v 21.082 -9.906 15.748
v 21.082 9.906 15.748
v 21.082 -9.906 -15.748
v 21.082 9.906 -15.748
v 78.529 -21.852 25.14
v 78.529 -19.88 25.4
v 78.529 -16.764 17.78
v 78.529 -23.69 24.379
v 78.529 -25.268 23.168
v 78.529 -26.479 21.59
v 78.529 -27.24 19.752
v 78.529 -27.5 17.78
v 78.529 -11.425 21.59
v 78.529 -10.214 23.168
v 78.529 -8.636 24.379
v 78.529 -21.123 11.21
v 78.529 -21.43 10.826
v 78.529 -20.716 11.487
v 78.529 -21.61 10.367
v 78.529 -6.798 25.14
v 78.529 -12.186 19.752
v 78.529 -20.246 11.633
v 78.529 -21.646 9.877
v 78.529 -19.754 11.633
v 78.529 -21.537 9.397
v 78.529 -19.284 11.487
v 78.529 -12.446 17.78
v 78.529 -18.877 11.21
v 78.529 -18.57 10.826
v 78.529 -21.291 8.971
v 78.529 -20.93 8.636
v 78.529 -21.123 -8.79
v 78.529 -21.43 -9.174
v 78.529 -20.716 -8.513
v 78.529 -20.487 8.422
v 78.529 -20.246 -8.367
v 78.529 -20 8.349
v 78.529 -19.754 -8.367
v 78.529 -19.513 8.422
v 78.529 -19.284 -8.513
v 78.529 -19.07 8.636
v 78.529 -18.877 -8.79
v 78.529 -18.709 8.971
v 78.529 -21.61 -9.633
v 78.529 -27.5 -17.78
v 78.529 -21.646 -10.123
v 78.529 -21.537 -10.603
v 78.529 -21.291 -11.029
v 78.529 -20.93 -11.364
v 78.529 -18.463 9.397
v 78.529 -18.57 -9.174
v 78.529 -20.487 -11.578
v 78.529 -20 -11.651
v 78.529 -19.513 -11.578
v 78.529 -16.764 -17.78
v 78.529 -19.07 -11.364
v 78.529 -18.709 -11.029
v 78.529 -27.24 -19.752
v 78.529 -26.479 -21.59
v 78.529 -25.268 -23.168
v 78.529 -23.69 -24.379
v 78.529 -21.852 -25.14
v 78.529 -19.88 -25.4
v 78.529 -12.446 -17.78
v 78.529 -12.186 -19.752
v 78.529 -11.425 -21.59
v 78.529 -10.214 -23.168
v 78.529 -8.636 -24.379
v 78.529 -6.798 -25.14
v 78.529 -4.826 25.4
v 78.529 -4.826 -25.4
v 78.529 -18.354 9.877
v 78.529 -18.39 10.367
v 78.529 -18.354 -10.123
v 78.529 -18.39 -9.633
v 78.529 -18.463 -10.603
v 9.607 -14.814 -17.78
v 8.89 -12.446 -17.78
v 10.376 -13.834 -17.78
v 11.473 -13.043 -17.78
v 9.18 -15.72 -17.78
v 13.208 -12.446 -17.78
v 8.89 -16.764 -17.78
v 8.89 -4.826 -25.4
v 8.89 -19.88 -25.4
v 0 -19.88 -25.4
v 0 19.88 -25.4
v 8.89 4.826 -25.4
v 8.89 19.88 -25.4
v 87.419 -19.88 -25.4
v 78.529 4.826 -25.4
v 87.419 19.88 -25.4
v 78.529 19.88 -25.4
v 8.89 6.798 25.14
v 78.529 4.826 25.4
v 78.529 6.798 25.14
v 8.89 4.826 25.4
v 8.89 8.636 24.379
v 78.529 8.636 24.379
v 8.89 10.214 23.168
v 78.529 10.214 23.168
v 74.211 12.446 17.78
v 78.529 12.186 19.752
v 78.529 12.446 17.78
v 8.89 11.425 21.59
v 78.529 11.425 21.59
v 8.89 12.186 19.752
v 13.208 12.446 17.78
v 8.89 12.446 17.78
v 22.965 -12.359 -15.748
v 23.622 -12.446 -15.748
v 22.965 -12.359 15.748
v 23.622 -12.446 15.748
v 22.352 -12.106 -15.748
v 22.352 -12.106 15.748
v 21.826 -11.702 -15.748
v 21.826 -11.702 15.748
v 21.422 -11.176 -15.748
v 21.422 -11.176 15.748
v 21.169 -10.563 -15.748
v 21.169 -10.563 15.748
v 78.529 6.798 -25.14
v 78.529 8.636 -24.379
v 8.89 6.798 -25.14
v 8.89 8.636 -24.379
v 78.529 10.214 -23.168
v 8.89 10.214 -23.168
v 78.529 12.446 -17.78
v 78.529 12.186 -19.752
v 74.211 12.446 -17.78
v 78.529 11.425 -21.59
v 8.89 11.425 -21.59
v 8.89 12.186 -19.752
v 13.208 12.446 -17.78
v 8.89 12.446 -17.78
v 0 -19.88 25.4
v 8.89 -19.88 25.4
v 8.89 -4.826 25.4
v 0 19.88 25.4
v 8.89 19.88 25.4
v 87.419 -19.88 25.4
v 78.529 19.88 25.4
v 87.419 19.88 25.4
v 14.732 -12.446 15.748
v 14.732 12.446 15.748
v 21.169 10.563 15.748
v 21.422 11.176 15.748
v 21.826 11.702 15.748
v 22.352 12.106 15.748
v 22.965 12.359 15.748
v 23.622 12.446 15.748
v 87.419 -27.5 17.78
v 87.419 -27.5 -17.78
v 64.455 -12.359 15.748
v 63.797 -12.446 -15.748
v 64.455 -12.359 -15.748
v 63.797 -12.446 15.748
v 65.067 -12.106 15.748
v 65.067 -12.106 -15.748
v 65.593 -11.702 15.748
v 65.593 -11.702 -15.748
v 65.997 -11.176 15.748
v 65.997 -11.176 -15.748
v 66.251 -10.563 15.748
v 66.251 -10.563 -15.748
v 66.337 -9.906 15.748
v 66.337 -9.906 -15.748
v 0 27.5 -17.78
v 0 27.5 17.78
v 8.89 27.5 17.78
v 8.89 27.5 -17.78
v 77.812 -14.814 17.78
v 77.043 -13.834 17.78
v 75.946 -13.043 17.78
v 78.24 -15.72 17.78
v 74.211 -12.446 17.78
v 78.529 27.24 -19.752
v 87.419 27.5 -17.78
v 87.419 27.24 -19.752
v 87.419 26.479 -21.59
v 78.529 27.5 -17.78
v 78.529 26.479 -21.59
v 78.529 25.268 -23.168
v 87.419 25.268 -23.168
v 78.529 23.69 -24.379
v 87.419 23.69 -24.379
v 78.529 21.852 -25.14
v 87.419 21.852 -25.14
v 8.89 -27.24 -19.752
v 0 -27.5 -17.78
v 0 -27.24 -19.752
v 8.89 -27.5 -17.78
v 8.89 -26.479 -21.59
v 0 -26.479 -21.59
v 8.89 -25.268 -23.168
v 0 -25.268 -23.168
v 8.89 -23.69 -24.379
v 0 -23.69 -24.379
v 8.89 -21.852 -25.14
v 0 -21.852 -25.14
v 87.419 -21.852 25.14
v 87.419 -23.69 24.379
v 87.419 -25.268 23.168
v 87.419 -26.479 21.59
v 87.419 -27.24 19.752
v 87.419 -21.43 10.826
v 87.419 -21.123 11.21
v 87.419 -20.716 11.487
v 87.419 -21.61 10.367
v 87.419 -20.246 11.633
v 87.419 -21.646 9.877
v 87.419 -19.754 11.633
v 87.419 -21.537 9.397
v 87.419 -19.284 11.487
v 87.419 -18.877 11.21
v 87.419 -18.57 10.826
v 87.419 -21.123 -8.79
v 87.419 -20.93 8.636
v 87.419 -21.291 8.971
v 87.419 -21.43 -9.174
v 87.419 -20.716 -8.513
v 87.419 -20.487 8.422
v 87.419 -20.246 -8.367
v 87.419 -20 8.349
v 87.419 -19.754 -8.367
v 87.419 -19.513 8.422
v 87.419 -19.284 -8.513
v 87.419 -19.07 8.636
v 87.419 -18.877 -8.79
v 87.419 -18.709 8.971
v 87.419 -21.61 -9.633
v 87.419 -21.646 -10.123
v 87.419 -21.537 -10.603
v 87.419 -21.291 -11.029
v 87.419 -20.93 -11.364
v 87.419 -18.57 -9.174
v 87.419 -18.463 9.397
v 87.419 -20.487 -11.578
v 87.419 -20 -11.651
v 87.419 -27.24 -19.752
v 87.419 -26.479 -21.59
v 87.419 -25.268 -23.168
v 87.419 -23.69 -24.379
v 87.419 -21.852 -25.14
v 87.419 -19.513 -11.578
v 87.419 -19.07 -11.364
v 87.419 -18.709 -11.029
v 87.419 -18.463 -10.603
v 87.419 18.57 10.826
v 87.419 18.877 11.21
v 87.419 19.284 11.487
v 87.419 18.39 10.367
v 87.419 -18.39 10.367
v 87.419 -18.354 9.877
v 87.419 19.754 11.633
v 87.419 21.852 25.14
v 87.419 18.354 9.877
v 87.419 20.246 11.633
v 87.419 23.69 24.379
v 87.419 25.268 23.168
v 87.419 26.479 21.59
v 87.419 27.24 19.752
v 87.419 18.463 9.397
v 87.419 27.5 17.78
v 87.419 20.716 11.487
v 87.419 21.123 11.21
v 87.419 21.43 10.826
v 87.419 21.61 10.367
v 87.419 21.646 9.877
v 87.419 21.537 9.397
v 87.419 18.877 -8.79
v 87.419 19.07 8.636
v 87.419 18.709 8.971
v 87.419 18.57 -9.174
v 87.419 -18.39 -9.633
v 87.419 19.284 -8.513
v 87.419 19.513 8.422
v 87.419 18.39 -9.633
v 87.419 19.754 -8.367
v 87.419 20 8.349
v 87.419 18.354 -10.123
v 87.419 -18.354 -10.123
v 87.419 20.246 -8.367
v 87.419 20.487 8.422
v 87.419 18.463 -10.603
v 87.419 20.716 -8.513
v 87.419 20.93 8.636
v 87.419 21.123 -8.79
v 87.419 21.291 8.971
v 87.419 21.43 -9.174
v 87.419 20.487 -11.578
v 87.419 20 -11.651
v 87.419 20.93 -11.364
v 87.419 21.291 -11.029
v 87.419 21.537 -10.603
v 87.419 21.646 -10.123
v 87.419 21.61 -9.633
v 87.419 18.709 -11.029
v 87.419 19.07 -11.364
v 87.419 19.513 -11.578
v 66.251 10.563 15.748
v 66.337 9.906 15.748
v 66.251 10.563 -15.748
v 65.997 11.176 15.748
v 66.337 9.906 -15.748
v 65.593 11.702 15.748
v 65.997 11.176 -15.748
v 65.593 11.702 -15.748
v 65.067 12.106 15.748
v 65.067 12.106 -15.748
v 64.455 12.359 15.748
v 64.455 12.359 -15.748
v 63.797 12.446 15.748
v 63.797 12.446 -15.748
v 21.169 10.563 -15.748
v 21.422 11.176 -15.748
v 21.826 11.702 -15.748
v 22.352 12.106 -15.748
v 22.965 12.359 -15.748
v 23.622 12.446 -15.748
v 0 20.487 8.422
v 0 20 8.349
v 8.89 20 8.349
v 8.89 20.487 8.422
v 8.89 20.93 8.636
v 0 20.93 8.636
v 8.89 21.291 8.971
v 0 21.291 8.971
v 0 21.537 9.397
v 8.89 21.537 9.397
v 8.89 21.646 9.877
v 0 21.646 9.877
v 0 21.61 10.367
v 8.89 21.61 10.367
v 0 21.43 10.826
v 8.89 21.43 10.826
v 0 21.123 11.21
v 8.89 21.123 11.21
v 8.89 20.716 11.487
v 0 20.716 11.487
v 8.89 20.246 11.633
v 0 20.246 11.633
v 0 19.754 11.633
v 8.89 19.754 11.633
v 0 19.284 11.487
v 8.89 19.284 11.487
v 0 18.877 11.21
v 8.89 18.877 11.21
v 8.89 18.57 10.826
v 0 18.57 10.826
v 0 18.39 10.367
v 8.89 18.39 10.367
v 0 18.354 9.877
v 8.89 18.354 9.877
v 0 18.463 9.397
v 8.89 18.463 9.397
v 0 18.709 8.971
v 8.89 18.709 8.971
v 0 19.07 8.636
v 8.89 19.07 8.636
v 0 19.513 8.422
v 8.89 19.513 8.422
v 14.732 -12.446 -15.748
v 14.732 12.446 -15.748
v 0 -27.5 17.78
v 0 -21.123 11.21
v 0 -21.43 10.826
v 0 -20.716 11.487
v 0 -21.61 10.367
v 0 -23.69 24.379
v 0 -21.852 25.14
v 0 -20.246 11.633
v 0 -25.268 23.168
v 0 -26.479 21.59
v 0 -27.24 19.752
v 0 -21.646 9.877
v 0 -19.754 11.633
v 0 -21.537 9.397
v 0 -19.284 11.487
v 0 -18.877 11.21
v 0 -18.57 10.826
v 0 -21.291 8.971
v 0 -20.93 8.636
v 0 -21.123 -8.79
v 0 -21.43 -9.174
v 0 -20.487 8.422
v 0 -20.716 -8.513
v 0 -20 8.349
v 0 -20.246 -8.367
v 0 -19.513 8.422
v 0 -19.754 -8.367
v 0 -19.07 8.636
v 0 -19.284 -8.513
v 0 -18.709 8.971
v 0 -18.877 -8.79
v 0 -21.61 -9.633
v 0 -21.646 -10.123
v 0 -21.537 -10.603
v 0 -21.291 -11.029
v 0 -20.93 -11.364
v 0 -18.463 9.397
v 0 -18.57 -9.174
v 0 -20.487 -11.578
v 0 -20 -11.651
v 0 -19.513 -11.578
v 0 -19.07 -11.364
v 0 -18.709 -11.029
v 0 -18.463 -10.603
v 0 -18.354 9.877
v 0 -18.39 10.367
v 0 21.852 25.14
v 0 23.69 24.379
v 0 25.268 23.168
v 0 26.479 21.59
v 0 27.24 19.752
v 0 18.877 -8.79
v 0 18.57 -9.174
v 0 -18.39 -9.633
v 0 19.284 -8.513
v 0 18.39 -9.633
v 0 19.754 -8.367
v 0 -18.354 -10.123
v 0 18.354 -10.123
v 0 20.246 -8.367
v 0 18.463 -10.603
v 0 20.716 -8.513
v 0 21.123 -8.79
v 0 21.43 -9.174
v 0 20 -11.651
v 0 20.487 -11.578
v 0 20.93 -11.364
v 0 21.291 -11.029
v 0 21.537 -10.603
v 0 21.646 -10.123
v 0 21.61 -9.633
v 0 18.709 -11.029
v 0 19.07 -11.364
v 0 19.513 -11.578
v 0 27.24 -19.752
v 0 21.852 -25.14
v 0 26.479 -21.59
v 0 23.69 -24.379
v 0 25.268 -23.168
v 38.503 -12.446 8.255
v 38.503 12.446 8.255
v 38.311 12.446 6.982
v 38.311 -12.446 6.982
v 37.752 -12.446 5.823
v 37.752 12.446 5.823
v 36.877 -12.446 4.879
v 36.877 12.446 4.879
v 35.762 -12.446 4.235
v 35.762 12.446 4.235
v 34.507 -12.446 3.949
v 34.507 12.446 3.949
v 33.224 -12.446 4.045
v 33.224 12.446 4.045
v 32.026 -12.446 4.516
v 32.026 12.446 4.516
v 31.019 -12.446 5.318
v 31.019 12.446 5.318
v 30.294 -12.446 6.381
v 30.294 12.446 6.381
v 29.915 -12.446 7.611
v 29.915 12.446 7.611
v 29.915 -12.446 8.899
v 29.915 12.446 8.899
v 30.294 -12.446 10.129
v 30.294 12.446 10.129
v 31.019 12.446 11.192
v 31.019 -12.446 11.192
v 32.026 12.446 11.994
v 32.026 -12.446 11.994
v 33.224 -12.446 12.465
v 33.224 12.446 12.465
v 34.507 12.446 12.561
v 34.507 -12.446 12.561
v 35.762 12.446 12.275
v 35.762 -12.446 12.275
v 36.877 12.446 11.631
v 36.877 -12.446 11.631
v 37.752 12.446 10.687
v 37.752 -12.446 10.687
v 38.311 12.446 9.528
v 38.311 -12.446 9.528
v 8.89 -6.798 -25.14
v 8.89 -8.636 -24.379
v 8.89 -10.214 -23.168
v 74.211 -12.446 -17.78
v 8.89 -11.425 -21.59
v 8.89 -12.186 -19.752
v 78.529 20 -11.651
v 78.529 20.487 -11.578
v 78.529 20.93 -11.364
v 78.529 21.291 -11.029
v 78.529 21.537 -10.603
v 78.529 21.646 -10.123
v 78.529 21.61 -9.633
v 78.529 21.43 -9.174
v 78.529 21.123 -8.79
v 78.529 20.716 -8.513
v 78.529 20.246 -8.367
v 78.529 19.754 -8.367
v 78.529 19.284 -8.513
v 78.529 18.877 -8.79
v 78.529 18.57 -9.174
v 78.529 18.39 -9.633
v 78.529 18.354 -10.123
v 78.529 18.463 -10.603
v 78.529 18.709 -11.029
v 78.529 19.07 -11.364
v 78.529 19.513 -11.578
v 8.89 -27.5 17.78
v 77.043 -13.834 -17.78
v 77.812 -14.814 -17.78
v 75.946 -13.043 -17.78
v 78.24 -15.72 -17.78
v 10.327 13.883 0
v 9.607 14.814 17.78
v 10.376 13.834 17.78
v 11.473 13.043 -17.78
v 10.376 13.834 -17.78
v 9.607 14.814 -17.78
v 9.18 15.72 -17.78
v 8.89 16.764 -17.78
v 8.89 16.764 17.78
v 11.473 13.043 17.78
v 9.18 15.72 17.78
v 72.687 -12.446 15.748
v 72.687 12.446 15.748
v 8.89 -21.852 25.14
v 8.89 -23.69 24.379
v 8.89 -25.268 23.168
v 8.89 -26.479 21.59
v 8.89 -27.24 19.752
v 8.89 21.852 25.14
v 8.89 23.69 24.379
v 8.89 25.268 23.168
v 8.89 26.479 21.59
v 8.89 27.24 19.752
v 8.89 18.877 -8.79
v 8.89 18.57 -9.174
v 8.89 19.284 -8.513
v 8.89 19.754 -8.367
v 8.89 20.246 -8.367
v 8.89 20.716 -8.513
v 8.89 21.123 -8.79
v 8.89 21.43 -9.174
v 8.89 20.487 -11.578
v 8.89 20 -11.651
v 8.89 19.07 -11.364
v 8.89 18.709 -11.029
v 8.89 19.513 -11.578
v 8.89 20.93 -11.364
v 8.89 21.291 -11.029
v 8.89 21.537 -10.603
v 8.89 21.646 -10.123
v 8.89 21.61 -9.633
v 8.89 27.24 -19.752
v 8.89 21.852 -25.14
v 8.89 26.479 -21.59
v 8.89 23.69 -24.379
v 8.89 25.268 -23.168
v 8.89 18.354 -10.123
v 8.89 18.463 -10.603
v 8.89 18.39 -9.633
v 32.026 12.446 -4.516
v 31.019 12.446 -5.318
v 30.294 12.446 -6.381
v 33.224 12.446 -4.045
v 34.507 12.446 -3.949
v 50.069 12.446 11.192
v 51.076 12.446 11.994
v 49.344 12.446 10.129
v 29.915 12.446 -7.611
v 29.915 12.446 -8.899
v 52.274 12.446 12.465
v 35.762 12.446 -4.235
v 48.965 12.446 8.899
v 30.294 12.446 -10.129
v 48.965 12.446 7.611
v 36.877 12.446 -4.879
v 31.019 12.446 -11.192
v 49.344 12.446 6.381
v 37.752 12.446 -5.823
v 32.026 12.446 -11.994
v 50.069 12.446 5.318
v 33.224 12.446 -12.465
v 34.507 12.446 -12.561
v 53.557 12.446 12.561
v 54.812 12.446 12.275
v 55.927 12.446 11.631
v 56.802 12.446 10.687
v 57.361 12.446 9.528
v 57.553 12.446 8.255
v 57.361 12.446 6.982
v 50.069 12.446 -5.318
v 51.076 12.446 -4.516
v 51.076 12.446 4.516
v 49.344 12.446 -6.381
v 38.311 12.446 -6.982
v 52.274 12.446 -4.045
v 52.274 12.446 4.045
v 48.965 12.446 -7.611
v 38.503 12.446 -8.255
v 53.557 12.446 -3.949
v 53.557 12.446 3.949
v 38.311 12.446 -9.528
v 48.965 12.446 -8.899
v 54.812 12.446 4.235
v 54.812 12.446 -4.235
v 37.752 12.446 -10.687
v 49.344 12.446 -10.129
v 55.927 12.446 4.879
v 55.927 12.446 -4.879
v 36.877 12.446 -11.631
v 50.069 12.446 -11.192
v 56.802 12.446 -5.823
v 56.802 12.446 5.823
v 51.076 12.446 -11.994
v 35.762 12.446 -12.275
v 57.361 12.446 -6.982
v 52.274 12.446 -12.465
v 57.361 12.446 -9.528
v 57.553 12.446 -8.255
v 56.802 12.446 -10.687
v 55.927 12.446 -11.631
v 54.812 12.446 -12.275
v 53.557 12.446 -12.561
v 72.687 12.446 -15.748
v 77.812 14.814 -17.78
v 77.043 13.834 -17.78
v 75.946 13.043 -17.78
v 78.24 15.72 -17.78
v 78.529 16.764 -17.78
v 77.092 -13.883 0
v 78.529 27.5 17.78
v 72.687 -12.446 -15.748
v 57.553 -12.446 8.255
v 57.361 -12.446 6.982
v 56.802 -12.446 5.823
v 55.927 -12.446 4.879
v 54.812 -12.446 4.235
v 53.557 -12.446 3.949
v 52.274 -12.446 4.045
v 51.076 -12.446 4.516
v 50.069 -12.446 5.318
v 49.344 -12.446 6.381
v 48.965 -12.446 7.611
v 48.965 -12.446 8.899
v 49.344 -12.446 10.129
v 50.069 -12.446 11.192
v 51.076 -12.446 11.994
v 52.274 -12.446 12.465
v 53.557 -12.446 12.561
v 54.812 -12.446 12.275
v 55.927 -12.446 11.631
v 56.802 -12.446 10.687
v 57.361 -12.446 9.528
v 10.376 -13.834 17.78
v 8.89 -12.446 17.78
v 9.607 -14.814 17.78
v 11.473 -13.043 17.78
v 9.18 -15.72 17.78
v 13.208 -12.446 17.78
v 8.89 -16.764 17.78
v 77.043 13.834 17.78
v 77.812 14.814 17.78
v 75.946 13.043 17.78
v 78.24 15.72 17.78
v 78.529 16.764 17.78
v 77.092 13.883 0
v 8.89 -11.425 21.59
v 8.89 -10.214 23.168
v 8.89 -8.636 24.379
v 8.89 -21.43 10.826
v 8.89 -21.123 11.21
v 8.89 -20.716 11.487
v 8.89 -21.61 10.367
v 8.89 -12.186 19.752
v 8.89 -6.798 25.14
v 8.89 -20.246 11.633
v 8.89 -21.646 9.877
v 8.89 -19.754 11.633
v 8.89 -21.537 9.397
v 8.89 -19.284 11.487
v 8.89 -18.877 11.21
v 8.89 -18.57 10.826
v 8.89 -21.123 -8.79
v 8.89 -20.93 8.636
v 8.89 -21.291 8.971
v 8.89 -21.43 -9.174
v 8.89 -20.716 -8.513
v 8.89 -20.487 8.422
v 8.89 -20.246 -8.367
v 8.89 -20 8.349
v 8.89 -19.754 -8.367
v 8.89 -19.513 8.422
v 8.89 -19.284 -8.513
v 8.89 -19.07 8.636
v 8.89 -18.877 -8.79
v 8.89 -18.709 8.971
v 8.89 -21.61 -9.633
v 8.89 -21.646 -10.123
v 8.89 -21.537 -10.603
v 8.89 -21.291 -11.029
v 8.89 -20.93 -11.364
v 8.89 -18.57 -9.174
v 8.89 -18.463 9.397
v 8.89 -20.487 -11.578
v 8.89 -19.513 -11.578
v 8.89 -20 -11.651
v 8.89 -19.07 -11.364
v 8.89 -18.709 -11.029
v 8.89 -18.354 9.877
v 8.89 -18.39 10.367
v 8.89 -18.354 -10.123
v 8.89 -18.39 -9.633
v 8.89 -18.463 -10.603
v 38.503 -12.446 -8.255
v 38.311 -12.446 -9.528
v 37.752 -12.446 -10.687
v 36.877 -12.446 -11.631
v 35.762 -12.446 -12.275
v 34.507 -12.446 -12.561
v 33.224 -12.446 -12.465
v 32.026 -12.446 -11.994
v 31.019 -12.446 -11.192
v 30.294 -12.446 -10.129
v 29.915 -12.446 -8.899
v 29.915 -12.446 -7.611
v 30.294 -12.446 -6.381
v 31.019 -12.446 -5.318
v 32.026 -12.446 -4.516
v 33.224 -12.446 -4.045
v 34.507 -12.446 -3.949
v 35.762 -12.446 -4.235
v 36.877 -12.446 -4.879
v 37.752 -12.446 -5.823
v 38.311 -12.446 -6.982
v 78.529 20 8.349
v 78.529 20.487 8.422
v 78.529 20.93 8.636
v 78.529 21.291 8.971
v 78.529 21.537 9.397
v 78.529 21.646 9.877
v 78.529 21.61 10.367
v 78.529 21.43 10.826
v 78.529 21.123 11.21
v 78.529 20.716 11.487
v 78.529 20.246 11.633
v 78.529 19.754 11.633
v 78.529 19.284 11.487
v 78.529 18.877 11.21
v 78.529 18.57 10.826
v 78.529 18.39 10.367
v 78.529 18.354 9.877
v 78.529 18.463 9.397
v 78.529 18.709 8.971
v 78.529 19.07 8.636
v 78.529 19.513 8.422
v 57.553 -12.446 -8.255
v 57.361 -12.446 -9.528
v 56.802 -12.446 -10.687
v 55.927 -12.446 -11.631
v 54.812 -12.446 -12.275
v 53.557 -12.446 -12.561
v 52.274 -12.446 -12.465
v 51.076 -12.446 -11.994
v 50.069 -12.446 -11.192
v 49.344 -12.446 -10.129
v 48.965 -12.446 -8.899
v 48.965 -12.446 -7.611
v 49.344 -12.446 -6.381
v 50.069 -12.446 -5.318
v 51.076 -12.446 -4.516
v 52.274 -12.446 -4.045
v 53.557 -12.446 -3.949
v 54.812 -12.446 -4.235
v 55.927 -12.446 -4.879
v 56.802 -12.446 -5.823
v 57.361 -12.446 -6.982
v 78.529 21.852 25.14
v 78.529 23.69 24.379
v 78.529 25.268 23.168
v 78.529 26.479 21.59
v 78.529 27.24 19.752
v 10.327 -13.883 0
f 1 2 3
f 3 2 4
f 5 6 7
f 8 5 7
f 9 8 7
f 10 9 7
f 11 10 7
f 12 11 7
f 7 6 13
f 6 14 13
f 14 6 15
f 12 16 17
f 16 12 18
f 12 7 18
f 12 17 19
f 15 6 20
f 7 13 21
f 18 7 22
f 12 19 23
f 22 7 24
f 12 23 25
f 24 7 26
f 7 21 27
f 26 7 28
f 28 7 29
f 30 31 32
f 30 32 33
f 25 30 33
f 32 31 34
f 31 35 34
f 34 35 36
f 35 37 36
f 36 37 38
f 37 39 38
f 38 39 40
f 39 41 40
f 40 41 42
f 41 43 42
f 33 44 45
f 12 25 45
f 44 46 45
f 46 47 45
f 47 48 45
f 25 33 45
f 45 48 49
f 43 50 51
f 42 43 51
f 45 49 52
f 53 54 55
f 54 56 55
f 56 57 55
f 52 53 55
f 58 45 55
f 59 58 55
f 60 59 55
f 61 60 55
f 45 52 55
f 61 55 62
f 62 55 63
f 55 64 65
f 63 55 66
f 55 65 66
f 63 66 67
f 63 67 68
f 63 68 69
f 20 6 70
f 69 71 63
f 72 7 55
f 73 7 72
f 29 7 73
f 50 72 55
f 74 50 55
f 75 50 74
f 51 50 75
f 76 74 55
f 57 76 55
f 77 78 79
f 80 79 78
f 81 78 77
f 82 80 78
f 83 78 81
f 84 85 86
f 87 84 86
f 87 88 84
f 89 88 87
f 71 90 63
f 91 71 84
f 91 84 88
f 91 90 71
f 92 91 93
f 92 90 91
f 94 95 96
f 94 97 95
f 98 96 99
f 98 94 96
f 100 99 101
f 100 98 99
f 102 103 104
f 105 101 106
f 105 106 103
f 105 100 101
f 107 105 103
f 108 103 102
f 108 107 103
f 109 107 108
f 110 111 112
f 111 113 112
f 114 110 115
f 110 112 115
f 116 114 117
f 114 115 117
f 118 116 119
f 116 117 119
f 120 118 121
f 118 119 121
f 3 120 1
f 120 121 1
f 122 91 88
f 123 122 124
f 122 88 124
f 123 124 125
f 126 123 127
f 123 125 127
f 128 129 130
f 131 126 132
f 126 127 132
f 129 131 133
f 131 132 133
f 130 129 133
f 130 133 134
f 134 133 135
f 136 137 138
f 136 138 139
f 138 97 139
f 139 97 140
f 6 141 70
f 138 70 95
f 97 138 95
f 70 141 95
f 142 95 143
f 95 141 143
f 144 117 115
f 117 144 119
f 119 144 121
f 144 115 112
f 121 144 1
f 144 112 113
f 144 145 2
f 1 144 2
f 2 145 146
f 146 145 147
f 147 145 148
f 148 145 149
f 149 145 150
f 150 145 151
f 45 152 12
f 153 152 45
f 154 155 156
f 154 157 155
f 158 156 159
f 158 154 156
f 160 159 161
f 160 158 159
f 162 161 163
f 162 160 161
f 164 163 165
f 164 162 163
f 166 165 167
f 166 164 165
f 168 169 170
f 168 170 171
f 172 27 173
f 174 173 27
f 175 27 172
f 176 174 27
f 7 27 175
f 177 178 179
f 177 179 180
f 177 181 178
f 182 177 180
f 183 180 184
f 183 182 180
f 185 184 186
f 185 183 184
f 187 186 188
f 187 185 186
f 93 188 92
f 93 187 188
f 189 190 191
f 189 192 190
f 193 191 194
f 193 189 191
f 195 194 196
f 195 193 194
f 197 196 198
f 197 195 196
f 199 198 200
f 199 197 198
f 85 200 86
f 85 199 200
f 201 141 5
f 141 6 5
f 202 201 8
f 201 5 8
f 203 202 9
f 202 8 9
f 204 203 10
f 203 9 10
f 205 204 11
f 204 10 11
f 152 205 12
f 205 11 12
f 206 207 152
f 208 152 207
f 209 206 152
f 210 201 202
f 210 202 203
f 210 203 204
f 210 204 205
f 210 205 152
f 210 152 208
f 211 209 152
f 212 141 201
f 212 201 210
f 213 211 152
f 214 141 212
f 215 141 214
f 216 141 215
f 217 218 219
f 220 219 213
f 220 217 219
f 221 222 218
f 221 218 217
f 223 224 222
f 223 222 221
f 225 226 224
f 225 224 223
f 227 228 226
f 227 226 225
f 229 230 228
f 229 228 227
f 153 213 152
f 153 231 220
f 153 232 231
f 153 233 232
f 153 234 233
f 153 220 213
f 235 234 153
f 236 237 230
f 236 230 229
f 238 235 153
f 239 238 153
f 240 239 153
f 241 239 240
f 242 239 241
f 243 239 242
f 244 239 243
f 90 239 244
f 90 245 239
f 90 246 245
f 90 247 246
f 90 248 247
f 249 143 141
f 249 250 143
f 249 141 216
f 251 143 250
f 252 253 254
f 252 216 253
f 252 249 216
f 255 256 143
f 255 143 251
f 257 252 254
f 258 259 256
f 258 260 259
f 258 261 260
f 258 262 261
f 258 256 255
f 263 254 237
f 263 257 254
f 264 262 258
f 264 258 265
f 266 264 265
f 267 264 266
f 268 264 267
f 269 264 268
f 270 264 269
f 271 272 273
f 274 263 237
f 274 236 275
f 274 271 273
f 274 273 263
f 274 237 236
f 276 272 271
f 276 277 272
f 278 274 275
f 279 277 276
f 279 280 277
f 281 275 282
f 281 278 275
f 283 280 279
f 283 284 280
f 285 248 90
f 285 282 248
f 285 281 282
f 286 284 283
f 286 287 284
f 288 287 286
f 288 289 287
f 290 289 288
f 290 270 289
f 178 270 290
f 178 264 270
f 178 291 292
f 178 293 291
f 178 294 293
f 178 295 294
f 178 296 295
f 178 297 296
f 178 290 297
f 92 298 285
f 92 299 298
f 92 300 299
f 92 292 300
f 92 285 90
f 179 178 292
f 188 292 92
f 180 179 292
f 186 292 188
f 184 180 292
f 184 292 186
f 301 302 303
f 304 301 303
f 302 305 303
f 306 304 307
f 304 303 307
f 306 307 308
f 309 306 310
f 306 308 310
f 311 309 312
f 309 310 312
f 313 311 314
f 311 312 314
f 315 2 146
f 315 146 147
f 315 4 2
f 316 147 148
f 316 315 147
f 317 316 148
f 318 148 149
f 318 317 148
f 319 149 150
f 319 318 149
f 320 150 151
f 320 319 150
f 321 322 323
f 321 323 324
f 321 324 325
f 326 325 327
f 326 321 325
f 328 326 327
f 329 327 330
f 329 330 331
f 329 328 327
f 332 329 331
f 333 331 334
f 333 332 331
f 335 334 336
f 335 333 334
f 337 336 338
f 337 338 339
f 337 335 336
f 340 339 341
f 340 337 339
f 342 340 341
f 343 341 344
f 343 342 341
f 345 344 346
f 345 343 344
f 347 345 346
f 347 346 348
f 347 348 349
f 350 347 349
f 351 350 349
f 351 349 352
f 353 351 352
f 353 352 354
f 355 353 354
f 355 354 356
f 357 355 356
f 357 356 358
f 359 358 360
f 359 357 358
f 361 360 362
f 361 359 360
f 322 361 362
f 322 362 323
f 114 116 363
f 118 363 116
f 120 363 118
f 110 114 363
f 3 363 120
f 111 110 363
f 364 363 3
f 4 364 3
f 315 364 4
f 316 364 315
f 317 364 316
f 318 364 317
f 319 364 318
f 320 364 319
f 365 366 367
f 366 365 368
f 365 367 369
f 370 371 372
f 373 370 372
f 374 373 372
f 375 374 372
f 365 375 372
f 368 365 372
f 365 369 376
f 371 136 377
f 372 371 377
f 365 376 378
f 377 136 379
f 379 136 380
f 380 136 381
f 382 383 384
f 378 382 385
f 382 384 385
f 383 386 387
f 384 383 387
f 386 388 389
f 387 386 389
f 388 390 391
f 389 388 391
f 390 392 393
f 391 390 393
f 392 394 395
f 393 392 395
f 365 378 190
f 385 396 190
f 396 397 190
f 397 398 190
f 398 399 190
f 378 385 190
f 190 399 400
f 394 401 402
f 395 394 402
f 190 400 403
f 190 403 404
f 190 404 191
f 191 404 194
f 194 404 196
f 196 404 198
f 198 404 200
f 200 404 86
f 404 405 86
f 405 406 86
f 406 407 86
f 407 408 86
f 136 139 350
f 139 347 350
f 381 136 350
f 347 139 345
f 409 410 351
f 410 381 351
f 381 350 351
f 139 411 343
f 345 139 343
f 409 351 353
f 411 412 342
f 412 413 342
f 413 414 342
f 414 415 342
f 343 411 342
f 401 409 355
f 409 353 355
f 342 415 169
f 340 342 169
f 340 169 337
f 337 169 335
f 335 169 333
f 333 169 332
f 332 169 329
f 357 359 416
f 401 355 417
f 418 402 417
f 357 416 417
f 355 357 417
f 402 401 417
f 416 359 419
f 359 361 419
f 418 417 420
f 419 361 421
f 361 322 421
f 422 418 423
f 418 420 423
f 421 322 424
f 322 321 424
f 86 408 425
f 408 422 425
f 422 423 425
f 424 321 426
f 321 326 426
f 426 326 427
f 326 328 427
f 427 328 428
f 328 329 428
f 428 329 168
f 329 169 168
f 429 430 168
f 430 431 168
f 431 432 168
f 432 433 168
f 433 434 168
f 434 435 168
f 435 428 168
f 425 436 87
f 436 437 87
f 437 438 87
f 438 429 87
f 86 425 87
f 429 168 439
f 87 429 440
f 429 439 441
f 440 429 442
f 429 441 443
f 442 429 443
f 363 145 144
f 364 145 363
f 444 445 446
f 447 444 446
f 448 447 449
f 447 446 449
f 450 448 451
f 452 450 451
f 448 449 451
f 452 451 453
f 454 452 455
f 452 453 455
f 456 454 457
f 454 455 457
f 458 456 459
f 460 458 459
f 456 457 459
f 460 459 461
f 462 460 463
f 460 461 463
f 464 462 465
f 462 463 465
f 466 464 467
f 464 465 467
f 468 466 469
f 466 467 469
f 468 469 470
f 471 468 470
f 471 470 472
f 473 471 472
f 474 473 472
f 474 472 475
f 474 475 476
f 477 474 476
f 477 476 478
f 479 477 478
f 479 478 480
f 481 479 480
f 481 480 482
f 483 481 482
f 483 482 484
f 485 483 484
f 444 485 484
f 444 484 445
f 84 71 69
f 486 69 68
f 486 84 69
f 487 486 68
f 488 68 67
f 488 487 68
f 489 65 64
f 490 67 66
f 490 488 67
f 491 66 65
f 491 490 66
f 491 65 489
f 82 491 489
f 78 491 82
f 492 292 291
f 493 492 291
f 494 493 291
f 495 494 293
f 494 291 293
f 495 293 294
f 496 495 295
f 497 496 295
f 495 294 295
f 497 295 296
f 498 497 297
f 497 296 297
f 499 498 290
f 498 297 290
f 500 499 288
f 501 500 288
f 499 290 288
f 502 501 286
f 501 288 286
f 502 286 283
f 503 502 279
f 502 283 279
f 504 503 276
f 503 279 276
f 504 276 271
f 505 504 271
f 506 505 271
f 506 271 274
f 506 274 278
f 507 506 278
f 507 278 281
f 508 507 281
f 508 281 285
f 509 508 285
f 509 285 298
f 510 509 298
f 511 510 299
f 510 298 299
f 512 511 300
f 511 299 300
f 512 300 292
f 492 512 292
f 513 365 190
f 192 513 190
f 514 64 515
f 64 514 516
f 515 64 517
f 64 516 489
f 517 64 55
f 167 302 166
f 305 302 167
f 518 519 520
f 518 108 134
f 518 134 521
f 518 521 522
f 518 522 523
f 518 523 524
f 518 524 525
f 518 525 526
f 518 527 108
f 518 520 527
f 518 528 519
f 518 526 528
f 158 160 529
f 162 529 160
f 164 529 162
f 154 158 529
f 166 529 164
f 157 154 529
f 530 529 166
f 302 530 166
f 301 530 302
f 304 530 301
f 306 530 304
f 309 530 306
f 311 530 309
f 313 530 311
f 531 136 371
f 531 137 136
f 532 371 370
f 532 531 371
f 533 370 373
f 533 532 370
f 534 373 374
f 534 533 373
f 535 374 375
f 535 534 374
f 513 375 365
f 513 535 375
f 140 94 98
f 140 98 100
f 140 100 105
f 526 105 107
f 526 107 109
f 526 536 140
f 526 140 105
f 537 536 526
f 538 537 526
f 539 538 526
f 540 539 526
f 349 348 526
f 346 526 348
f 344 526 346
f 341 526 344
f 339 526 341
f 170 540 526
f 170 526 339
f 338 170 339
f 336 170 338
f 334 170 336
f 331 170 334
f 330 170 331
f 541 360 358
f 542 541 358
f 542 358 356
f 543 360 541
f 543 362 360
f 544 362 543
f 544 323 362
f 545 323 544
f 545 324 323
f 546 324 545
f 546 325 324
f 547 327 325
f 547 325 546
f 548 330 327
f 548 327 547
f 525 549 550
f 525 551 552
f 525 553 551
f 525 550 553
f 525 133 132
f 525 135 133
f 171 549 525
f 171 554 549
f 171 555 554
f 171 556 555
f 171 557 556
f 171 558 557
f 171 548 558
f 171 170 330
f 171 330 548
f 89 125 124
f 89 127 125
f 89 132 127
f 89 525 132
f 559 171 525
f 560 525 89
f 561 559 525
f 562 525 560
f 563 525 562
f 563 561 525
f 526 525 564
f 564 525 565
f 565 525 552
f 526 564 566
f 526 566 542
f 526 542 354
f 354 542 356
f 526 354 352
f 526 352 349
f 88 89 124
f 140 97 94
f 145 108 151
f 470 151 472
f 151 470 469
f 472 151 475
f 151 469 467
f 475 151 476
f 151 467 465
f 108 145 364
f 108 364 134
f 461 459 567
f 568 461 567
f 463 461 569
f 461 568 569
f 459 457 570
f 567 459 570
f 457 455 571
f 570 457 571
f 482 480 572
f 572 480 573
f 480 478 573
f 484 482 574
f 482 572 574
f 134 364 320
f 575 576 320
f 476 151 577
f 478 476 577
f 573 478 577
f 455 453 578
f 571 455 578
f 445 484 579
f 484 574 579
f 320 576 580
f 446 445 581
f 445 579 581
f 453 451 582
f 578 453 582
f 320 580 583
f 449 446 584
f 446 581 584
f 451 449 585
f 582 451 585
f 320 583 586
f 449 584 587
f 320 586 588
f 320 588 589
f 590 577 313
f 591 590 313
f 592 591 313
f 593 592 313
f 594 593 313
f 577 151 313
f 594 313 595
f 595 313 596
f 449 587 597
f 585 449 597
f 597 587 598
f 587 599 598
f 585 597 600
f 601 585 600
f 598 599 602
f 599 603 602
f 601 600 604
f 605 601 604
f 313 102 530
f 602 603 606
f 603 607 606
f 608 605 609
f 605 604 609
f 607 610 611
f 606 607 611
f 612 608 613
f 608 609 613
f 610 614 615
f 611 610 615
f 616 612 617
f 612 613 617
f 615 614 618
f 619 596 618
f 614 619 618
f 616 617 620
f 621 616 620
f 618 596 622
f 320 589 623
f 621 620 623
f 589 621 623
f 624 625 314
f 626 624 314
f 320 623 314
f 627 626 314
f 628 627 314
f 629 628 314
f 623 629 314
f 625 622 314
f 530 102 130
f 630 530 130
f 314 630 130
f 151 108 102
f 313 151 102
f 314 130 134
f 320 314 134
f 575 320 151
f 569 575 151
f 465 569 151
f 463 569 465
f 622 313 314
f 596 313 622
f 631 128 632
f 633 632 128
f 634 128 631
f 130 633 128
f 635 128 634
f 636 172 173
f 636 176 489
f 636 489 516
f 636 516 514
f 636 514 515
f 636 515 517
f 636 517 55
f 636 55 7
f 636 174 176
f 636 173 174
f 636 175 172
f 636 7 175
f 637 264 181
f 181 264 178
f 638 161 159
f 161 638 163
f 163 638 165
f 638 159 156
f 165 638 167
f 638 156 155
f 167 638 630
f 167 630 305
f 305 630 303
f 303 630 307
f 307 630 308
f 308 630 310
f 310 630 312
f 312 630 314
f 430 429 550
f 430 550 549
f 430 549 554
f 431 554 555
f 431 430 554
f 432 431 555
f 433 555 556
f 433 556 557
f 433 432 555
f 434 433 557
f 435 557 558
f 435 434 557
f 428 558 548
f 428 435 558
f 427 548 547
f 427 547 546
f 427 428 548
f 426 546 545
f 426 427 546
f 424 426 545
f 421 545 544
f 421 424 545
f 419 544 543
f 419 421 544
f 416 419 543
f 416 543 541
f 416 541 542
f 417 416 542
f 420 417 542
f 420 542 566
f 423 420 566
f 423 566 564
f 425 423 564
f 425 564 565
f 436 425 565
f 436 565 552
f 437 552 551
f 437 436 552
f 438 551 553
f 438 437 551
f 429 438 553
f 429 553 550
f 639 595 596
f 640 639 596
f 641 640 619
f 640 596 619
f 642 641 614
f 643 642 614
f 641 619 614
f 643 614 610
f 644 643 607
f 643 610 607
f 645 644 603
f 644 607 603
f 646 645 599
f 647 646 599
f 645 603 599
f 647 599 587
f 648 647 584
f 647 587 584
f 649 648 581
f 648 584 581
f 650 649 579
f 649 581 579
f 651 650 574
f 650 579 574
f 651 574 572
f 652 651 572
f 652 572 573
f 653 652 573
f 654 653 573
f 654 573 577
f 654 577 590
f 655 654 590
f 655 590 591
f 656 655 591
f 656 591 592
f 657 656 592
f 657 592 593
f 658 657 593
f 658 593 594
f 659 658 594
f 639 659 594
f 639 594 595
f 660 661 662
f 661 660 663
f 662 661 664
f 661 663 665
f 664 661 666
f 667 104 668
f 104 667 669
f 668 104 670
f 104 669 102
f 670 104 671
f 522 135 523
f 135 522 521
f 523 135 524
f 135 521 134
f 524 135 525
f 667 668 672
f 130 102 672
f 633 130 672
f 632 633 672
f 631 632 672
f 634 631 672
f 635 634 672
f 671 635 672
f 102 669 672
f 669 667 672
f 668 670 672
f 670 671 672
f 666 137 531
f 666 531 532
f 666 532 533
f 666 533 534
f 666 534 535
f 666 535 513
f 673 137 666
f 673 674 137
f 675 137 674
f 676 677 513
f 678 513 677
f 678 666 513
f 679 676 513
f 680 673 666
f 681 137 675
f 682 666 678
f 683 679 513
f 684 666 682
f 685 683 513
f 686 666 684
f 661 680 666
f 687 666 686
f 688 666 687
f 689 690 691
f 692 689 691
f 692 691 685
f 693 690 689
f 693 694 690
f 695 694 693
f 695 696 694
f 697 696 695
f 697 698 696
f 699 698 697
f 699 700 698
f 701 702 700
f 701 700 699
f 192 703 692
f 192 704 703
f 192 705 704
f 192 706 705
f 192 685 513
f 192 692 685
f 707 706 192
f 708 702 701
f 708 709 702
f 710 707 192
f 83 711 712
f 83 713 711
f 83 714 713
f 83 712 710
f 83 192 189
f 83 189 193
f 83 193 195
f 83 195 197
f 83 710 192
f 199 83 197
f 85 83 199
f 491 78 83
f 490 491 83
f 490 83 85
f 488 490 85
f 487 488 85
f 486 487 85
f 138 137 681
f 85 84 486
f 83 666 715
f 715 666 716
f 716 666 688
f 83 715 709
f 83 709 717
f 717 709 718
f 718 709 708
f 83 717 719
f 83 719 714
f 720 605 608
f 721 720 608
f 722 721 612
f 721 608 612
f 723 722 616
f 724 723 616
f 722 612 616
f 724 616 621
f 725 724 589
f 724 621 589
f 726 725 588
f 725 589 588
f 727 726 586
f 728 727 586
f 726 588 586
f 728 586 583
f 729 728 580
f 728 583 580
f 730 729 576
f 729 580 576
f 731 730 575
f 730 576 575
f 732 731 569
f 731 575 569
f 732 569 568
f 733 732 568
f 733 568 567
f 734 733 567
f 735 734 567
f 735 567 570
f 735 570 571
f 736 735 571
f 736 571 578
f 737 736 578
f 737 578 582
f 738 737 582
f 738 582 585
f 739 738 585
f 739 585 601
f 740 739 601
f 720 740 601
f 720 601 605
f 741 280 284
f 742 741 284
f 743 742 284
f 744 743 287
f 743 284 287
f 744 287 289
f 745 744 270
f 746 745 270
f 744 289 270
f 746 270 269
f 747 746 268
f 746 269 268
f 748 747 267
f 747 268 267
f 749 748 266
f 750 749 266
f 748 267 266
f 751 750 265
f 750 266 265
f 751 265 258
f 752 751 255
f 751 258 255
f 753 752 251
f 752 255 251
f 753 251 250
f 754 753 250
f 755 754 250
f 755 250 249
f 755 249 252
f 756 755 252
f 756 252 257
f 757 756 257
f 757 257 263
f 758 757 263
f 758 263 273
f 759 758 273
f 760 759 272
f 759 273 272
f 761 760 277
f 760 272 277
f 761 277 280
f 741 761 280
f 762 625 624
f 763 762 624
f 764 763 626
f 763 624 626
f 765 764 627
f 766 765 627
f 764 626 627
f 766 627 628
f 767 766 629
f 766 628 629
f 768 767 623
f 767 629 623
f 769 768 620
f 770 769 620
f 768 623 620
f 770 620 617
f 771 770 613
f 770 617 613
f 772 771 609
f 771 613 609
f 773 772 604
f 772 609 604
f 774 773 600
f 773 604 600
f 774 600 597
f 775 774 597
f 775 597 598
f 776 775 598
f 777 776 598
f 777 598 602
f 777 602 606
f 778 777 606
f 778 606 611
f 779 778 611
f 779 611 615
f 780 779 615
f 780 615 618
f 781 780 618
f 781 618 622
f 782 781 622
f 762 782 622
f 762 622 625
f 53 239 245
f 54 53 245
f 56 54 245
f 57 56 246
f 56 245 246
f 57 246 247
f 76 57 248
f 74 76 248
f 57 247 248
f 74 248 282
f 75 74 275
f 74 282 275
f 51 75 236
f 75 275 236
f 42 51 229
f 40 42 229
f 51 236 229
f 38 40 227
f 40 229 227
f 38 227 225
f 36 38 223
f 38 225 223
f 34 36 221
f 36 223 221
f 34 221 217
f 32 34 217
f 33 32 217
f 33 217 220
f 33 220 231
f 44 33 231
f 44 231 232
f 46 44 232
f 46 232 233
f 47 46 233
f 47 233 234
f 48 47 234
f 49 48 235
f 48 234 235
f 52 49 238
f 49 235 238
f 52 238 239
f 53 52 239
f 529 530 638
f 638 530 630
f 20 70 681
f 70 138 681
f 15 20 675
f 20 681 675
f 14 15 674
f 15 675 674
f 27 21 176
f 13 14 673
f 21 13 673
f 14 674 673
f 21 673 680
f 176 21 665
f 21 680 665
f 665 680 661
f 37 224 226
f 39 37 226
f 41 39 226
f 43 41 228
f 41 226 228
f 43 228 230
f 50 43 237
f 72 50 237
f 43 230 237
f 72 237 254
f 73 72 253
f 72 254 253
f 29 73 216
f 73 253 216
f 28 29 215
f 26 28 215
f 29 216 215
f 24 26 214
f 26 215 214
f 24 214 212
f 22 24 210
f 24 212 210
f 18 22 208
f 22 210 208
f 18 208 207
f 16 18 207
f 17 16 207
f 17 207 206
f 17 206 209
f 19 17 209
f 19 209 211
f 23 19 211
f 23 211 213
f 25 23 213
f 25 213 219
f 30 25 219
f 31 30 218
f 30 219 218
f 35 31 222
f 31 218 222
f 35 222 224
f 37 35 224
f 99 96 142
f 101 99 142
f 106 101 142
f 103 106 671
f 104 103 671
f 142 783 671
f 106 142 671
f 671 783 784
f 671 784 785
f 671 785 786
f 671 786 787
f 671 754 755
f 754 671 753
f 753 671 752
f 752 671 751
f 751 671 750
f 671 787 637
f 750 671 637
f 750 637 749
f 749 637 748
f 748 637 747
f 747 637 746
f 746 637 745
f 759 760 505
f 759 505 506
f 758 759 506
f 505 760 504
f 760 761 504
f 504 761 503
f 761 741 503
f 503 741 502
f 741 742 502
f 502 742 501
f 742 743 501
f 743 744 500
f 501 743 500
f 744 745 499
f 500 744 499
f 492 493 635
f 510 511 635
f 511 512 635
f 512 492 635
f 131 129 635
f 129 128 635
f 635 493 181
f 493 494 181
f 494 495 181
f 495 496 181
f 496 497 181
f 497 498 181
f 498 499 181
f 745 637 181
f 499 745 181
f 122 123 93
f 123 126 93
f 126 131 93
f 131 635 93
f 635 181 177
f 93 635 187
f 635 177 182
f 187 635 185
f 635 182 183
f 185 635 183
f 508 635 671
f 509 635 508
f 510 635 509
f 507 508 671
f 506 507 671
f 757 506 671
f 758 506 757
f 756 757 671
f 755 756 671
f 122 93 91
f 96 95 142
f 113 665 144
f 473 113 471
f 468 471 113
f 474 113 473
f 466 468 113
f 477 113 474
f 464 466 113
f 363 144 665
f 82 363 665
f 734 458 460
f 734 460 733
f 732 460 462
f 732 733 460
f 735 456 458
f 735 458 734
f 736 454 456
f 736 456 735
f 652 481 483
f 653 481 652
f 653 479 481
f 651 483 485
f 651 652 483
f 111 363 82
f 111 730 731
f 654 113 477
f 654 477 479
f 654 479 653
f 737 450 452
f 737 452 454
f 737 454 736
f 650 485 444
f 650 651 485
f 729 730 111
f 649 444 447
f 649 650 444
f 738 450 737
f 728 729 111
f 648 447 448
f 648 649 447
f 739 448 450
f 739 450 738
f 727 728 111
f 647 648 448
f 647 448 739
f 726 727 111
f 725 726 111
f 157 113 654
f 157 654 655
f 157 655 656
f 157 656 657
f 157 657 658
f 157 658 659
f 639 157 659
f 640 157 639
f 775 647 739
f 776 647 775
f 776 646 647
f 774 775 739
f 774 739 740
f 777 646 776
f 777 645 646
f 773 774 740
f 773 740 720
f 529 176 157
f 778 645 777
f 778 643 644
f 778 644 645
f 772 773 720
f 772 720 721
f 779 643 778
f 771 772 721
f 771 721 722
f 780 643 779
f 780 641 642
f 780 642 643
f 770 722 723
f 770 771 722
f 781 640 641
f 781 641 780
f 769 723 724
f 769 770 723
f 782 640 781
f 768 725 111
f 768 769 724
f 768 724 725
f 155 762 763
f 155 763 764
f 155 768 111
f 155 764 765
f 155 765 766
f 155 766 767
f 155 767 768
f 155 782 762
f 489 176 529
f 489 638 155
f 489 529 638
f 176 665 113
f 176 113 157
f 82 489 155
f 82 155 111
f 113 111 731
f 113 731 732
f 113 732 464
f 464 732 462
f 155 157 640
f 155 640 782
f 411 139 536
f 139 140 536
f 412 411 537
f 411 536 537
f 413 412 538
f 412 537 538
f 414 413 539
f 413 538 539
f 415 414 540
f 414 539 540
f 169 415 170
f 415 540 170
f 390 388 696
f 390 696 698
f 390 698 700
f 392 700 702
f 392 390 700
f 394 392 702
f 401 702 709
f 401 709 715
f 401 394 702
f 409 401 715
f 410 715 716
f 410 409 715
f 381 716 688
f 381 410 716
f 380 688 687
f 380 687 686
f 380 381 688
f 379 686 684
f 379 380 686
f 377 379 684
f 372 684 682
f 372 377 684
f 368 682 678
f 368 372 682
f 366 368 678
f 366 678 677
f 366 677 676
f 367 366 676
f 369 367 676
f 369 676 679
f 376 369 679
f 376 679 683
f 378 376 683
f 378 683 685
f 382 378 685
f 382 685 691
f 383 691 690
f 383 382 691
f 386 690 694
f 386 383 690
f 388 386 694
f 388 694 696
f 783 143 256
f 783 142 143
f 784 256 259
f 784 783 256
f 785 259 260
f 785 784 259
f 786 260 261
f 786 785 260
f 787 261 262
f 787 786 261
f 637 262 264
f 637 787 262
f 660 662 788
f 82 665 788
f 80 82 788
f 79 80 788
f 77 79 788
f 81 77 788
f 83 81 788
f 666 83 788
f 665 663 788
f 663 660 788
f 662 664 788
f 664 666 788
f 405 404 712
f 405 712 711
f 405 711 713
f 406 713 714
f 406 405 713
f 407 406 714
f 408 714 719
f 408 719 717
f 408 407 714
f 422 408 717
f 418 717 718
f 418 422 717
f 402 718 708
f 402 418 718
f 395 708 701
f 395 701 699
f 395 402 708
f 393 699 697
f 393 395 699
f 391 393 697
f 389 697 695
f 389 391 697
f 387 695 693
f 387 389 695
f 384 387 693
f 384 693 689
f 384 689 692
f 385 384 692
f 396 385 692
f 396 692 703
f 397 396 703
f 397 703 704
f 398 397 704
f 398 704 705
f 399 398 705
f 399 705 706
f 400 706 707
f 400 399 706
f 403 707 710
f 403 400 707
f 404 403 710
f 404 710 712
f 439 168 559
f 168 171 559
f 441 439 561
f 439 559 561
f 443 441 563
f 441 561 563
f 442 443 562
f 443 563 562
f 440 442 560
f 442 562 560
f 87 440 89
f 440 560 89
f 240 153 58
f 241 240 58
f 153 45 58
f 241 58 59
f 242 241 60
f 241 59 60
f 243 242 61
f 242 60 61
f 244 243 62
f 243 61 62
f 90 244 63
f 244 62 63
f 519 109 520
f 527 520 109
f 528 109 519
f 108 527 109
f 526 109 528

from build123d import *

# Parameters (mm, degrees)
SKETCH1_W            = 50.8
SKETCH1_H            = 55
SKETCH1_R            = 1.651
BOSS_EXTRUDE1_DEPTH  = 8.89
FILLET1_R            = 7.62
SKETCH2_W            = 50.8
SKETCH2_H            = 24.892
BOSS_EXTRUDE2_DEPTH  = 34.81959
FILLET2_R            = 7.62
SKETCH7_R            = 4.318
CUT_EXTRUDE4_DEPTH   = 40.946
BOSS_EXTRUDE4_START  = -7.62
BOSS_EXTRUDE4_DEPTH  = 35.56
MIRROR9_START        = -7.62
MIRROR9_COPY_1_DEPTH = 35.56
SKETCH10_W           = 6.35
SKETCH10_H           = 31.496
CUT_EXTRUDE5_DEPTH   = 40.946
FILLET4_R            = 2.54


with BuildPart() as part:
    # Sketch1 → Boss-Extrude1 (new body)
    with BuildSketch(Plane(origin=(0, 0, 0), x_dir=(0, 0, -1), z_dir=(1, 0, 0))):
        Rectangle(SKETCH1_W, SKETCH1_H)
        with Locations((-10, 20)):
            Circle(SKETCH1_R, mode=Mode.SUBTRACT)
        with Locations((10, 20)):
            Circle(SKETCH1_R, mode=Mode.SUBTRACT)
        with Locations((-10, -20)):
            Circle(SKETCH1_R, mode=Mode.SUBTRACT)
        with Locations((10, -20)):
            Circle(SKETCH1_R, mode=Mode.SUBTRACT)
    extrude(amount=BOSS_EXTRUDE1_DEPTH)

    # Fillet1
    fillet1_edges = [part.edges().sort_by_distance(p)[0] for p in [
        (4.445, 27.5, 25.4),
        (4.445, 27.5, -25.4),
        (4.445, -27.5, -25.4),
        (4.445, -27.5, 25.4),
    ]]
    fillet(fillet1_edges, radius=FILLET1_R)

    # Sketch2 → Boss-Extrude2 (add)
    with BuildSketch(Plane(origin=(8.89, 0, 0), x_dir=(0, 0, -1), z_dir=(1, 0, 0))):
        Rectangle(SKETCH2_W, SKETCH2_H)
    extrude(amount=BOSS_EXTRUDE2_DEPTH)

    # Fillet2
    fillet2_edges = [part.edges().sort_by_distance(p)[0] for p in [
        (26.299795, 12.446, 25.4),
        (26.299795, -12.446, 25.4),
        (26.299795, -12.446, -25.4),
        (26.299795, 12.446, -25.4),
    ]]
    fillet(fillet2_edges, radius=FILLET2_R)

    # Mirror6: part across plane


with BuildPart() as part_1:
    add(part.part)
    add(part.part.mirror(Plane(origin=(43.70959, 0, 0), x_dir=(0, 0, 1), z_dir=(1, 0, 0))))

    # Sketch7 → Cut-Extrude4 (cut, through all)
    with BuildSketch(Plane(origin=(0, 12.446, 0), x_dir=(1, 0, 0), z_dir=(0, 1, 0))):
        with Locations((34.18459, 8.255)):
            Circle(SKETCH7_R)
        with Locations((34.18459, -8.255)):
            Circle(SKETCH7_R)
        with Locations((53.23459, 8.255)):
            Circle(SKETCH7_R)
        with Locations((53.23459, -8.255)):
            Circle(SKETCH7_R)
    extrude(amount=-CUT_EXTRUDE4_DEPTH, mode=Mode.SUBTRACT)

    # Sketch9 → Boss-Extrude4 (add)
    with BuildSketch(Plane.XY.offset(25.4).offset(BOSS_EXTRUDE4_START)):
        with BuildLine():
            Line((10.326840979, 13.882840979), (8.89, 12.446))
            Line((8.89, 12.446), (13.208, 12.446))
            add(Edge.make_bspline(
                [(10.326840979, 13.882840979), (11.406340979, 12.803340979), (13.208, 12.446)],
                knots=[0.5, 0.5, 0.5, 1, 1, 1], degree=2))
        make_face()
        with BuildLine():
            add(Edge.make_bspline(
                [(8.89, 16.764), (9.247340979, 14.962340979), (10.326840979, 13.882840979)],
                knots=[0, 0, 0, 0.5, 0.5, 0.5], degree=2))
            Line((8.89, 16.764), (8.89, 12.446))
            Line((8.89, 12.446), (10.326840979, 13.882840979))
        make_face()
    boss_extrude4 = extrude(amount=-BOSS_EXTRUDE4_DEPTH)

    # Mirror8: Boss-Extrude4 across plane
    add(boss_extrude4.mirror(Plane.ZX))

    # Mirror9: Boss-Extrude4 across plane
    add(boss_extrude4.mirror(Plane(origin=(43.70959, 0, 0), x_dir=(0, 0, 1), z_dir=(1, 0, 0))))

    # Mirror9 copy 1 sketch → Mirror9 copy 1 (add)
    with BuildSketch(Plane(origin=(87.41918, 0, 25.4), x_dir=(-1, 0, 0), z_dir=(0, 0, 1)).offset(MIRROR9_START)):
        with BuildLine():
            Line((10.326840979, 13.882840979), (8.89, 12.446))
            Line((8.89, 12.446), (13.208, 12.446))
            add(Edge.make_bspline(
                [(10.326840979, 13.882840979), (11.406340979, 12.803340979), (13.208, 12.446)],
                knots=[0.5, 0.5, 0.5, 1, 1, 1], degree=2))
        make_face()
        with BuildLine():
            add(Edge.make_bspline(
                [(8.89, 16.764), (9.247340979, 14.962340979), (10.326840979, 13.882840979)],
                knots=[0, 0, 0, 0.5, 0.5, 0.5], degree=2))
            Line((8.89, 16.764), (8.89, 12.446))
            Line((8.89, 12.446), (10.326840979, 13.882840979))
        make_face()
    extrude(amount=-MIRROR9_COPY_1_DEPTH)

    # Sketch10 → Cut-Extrude5 (cut, through all)
    with BuildSketch(Plane(origin=(0, 12.446, 0), x_dir=(1, 0, 0), z_dir=(0, 1, 0))):
        with Locations((17.907, 0)):
            Rectangle(SKETCH10_W, SKETCH10_H)
    cut_extrude5 = extrude(amount=-CUT_EXTRUDE5_DEPTH, mode=Mode.SUBTRACT)

    # Mirror10: Cut-Extrude5 across plane
    add(cut_extrude5.mirror(Plane(origin=(43.70959, 0, 0), x_dir=(0, 0, 1), z_dir=(1, 0, 0))), mode=Mode.SUBTRACT)

    # Fillet4
    fillet4_edges = [part_1.edges().sort_by_distance(p)[0] for p in [
        (21.082, -12.446, 0),
        (21.082, 12.446, 0),
        (66.33718, 12.446, 0),
        (66.33718, -12.446, 0),
    ]]
    fillet(fillet4_edges, radius=FILLET4_R)


solid = part_1.part
